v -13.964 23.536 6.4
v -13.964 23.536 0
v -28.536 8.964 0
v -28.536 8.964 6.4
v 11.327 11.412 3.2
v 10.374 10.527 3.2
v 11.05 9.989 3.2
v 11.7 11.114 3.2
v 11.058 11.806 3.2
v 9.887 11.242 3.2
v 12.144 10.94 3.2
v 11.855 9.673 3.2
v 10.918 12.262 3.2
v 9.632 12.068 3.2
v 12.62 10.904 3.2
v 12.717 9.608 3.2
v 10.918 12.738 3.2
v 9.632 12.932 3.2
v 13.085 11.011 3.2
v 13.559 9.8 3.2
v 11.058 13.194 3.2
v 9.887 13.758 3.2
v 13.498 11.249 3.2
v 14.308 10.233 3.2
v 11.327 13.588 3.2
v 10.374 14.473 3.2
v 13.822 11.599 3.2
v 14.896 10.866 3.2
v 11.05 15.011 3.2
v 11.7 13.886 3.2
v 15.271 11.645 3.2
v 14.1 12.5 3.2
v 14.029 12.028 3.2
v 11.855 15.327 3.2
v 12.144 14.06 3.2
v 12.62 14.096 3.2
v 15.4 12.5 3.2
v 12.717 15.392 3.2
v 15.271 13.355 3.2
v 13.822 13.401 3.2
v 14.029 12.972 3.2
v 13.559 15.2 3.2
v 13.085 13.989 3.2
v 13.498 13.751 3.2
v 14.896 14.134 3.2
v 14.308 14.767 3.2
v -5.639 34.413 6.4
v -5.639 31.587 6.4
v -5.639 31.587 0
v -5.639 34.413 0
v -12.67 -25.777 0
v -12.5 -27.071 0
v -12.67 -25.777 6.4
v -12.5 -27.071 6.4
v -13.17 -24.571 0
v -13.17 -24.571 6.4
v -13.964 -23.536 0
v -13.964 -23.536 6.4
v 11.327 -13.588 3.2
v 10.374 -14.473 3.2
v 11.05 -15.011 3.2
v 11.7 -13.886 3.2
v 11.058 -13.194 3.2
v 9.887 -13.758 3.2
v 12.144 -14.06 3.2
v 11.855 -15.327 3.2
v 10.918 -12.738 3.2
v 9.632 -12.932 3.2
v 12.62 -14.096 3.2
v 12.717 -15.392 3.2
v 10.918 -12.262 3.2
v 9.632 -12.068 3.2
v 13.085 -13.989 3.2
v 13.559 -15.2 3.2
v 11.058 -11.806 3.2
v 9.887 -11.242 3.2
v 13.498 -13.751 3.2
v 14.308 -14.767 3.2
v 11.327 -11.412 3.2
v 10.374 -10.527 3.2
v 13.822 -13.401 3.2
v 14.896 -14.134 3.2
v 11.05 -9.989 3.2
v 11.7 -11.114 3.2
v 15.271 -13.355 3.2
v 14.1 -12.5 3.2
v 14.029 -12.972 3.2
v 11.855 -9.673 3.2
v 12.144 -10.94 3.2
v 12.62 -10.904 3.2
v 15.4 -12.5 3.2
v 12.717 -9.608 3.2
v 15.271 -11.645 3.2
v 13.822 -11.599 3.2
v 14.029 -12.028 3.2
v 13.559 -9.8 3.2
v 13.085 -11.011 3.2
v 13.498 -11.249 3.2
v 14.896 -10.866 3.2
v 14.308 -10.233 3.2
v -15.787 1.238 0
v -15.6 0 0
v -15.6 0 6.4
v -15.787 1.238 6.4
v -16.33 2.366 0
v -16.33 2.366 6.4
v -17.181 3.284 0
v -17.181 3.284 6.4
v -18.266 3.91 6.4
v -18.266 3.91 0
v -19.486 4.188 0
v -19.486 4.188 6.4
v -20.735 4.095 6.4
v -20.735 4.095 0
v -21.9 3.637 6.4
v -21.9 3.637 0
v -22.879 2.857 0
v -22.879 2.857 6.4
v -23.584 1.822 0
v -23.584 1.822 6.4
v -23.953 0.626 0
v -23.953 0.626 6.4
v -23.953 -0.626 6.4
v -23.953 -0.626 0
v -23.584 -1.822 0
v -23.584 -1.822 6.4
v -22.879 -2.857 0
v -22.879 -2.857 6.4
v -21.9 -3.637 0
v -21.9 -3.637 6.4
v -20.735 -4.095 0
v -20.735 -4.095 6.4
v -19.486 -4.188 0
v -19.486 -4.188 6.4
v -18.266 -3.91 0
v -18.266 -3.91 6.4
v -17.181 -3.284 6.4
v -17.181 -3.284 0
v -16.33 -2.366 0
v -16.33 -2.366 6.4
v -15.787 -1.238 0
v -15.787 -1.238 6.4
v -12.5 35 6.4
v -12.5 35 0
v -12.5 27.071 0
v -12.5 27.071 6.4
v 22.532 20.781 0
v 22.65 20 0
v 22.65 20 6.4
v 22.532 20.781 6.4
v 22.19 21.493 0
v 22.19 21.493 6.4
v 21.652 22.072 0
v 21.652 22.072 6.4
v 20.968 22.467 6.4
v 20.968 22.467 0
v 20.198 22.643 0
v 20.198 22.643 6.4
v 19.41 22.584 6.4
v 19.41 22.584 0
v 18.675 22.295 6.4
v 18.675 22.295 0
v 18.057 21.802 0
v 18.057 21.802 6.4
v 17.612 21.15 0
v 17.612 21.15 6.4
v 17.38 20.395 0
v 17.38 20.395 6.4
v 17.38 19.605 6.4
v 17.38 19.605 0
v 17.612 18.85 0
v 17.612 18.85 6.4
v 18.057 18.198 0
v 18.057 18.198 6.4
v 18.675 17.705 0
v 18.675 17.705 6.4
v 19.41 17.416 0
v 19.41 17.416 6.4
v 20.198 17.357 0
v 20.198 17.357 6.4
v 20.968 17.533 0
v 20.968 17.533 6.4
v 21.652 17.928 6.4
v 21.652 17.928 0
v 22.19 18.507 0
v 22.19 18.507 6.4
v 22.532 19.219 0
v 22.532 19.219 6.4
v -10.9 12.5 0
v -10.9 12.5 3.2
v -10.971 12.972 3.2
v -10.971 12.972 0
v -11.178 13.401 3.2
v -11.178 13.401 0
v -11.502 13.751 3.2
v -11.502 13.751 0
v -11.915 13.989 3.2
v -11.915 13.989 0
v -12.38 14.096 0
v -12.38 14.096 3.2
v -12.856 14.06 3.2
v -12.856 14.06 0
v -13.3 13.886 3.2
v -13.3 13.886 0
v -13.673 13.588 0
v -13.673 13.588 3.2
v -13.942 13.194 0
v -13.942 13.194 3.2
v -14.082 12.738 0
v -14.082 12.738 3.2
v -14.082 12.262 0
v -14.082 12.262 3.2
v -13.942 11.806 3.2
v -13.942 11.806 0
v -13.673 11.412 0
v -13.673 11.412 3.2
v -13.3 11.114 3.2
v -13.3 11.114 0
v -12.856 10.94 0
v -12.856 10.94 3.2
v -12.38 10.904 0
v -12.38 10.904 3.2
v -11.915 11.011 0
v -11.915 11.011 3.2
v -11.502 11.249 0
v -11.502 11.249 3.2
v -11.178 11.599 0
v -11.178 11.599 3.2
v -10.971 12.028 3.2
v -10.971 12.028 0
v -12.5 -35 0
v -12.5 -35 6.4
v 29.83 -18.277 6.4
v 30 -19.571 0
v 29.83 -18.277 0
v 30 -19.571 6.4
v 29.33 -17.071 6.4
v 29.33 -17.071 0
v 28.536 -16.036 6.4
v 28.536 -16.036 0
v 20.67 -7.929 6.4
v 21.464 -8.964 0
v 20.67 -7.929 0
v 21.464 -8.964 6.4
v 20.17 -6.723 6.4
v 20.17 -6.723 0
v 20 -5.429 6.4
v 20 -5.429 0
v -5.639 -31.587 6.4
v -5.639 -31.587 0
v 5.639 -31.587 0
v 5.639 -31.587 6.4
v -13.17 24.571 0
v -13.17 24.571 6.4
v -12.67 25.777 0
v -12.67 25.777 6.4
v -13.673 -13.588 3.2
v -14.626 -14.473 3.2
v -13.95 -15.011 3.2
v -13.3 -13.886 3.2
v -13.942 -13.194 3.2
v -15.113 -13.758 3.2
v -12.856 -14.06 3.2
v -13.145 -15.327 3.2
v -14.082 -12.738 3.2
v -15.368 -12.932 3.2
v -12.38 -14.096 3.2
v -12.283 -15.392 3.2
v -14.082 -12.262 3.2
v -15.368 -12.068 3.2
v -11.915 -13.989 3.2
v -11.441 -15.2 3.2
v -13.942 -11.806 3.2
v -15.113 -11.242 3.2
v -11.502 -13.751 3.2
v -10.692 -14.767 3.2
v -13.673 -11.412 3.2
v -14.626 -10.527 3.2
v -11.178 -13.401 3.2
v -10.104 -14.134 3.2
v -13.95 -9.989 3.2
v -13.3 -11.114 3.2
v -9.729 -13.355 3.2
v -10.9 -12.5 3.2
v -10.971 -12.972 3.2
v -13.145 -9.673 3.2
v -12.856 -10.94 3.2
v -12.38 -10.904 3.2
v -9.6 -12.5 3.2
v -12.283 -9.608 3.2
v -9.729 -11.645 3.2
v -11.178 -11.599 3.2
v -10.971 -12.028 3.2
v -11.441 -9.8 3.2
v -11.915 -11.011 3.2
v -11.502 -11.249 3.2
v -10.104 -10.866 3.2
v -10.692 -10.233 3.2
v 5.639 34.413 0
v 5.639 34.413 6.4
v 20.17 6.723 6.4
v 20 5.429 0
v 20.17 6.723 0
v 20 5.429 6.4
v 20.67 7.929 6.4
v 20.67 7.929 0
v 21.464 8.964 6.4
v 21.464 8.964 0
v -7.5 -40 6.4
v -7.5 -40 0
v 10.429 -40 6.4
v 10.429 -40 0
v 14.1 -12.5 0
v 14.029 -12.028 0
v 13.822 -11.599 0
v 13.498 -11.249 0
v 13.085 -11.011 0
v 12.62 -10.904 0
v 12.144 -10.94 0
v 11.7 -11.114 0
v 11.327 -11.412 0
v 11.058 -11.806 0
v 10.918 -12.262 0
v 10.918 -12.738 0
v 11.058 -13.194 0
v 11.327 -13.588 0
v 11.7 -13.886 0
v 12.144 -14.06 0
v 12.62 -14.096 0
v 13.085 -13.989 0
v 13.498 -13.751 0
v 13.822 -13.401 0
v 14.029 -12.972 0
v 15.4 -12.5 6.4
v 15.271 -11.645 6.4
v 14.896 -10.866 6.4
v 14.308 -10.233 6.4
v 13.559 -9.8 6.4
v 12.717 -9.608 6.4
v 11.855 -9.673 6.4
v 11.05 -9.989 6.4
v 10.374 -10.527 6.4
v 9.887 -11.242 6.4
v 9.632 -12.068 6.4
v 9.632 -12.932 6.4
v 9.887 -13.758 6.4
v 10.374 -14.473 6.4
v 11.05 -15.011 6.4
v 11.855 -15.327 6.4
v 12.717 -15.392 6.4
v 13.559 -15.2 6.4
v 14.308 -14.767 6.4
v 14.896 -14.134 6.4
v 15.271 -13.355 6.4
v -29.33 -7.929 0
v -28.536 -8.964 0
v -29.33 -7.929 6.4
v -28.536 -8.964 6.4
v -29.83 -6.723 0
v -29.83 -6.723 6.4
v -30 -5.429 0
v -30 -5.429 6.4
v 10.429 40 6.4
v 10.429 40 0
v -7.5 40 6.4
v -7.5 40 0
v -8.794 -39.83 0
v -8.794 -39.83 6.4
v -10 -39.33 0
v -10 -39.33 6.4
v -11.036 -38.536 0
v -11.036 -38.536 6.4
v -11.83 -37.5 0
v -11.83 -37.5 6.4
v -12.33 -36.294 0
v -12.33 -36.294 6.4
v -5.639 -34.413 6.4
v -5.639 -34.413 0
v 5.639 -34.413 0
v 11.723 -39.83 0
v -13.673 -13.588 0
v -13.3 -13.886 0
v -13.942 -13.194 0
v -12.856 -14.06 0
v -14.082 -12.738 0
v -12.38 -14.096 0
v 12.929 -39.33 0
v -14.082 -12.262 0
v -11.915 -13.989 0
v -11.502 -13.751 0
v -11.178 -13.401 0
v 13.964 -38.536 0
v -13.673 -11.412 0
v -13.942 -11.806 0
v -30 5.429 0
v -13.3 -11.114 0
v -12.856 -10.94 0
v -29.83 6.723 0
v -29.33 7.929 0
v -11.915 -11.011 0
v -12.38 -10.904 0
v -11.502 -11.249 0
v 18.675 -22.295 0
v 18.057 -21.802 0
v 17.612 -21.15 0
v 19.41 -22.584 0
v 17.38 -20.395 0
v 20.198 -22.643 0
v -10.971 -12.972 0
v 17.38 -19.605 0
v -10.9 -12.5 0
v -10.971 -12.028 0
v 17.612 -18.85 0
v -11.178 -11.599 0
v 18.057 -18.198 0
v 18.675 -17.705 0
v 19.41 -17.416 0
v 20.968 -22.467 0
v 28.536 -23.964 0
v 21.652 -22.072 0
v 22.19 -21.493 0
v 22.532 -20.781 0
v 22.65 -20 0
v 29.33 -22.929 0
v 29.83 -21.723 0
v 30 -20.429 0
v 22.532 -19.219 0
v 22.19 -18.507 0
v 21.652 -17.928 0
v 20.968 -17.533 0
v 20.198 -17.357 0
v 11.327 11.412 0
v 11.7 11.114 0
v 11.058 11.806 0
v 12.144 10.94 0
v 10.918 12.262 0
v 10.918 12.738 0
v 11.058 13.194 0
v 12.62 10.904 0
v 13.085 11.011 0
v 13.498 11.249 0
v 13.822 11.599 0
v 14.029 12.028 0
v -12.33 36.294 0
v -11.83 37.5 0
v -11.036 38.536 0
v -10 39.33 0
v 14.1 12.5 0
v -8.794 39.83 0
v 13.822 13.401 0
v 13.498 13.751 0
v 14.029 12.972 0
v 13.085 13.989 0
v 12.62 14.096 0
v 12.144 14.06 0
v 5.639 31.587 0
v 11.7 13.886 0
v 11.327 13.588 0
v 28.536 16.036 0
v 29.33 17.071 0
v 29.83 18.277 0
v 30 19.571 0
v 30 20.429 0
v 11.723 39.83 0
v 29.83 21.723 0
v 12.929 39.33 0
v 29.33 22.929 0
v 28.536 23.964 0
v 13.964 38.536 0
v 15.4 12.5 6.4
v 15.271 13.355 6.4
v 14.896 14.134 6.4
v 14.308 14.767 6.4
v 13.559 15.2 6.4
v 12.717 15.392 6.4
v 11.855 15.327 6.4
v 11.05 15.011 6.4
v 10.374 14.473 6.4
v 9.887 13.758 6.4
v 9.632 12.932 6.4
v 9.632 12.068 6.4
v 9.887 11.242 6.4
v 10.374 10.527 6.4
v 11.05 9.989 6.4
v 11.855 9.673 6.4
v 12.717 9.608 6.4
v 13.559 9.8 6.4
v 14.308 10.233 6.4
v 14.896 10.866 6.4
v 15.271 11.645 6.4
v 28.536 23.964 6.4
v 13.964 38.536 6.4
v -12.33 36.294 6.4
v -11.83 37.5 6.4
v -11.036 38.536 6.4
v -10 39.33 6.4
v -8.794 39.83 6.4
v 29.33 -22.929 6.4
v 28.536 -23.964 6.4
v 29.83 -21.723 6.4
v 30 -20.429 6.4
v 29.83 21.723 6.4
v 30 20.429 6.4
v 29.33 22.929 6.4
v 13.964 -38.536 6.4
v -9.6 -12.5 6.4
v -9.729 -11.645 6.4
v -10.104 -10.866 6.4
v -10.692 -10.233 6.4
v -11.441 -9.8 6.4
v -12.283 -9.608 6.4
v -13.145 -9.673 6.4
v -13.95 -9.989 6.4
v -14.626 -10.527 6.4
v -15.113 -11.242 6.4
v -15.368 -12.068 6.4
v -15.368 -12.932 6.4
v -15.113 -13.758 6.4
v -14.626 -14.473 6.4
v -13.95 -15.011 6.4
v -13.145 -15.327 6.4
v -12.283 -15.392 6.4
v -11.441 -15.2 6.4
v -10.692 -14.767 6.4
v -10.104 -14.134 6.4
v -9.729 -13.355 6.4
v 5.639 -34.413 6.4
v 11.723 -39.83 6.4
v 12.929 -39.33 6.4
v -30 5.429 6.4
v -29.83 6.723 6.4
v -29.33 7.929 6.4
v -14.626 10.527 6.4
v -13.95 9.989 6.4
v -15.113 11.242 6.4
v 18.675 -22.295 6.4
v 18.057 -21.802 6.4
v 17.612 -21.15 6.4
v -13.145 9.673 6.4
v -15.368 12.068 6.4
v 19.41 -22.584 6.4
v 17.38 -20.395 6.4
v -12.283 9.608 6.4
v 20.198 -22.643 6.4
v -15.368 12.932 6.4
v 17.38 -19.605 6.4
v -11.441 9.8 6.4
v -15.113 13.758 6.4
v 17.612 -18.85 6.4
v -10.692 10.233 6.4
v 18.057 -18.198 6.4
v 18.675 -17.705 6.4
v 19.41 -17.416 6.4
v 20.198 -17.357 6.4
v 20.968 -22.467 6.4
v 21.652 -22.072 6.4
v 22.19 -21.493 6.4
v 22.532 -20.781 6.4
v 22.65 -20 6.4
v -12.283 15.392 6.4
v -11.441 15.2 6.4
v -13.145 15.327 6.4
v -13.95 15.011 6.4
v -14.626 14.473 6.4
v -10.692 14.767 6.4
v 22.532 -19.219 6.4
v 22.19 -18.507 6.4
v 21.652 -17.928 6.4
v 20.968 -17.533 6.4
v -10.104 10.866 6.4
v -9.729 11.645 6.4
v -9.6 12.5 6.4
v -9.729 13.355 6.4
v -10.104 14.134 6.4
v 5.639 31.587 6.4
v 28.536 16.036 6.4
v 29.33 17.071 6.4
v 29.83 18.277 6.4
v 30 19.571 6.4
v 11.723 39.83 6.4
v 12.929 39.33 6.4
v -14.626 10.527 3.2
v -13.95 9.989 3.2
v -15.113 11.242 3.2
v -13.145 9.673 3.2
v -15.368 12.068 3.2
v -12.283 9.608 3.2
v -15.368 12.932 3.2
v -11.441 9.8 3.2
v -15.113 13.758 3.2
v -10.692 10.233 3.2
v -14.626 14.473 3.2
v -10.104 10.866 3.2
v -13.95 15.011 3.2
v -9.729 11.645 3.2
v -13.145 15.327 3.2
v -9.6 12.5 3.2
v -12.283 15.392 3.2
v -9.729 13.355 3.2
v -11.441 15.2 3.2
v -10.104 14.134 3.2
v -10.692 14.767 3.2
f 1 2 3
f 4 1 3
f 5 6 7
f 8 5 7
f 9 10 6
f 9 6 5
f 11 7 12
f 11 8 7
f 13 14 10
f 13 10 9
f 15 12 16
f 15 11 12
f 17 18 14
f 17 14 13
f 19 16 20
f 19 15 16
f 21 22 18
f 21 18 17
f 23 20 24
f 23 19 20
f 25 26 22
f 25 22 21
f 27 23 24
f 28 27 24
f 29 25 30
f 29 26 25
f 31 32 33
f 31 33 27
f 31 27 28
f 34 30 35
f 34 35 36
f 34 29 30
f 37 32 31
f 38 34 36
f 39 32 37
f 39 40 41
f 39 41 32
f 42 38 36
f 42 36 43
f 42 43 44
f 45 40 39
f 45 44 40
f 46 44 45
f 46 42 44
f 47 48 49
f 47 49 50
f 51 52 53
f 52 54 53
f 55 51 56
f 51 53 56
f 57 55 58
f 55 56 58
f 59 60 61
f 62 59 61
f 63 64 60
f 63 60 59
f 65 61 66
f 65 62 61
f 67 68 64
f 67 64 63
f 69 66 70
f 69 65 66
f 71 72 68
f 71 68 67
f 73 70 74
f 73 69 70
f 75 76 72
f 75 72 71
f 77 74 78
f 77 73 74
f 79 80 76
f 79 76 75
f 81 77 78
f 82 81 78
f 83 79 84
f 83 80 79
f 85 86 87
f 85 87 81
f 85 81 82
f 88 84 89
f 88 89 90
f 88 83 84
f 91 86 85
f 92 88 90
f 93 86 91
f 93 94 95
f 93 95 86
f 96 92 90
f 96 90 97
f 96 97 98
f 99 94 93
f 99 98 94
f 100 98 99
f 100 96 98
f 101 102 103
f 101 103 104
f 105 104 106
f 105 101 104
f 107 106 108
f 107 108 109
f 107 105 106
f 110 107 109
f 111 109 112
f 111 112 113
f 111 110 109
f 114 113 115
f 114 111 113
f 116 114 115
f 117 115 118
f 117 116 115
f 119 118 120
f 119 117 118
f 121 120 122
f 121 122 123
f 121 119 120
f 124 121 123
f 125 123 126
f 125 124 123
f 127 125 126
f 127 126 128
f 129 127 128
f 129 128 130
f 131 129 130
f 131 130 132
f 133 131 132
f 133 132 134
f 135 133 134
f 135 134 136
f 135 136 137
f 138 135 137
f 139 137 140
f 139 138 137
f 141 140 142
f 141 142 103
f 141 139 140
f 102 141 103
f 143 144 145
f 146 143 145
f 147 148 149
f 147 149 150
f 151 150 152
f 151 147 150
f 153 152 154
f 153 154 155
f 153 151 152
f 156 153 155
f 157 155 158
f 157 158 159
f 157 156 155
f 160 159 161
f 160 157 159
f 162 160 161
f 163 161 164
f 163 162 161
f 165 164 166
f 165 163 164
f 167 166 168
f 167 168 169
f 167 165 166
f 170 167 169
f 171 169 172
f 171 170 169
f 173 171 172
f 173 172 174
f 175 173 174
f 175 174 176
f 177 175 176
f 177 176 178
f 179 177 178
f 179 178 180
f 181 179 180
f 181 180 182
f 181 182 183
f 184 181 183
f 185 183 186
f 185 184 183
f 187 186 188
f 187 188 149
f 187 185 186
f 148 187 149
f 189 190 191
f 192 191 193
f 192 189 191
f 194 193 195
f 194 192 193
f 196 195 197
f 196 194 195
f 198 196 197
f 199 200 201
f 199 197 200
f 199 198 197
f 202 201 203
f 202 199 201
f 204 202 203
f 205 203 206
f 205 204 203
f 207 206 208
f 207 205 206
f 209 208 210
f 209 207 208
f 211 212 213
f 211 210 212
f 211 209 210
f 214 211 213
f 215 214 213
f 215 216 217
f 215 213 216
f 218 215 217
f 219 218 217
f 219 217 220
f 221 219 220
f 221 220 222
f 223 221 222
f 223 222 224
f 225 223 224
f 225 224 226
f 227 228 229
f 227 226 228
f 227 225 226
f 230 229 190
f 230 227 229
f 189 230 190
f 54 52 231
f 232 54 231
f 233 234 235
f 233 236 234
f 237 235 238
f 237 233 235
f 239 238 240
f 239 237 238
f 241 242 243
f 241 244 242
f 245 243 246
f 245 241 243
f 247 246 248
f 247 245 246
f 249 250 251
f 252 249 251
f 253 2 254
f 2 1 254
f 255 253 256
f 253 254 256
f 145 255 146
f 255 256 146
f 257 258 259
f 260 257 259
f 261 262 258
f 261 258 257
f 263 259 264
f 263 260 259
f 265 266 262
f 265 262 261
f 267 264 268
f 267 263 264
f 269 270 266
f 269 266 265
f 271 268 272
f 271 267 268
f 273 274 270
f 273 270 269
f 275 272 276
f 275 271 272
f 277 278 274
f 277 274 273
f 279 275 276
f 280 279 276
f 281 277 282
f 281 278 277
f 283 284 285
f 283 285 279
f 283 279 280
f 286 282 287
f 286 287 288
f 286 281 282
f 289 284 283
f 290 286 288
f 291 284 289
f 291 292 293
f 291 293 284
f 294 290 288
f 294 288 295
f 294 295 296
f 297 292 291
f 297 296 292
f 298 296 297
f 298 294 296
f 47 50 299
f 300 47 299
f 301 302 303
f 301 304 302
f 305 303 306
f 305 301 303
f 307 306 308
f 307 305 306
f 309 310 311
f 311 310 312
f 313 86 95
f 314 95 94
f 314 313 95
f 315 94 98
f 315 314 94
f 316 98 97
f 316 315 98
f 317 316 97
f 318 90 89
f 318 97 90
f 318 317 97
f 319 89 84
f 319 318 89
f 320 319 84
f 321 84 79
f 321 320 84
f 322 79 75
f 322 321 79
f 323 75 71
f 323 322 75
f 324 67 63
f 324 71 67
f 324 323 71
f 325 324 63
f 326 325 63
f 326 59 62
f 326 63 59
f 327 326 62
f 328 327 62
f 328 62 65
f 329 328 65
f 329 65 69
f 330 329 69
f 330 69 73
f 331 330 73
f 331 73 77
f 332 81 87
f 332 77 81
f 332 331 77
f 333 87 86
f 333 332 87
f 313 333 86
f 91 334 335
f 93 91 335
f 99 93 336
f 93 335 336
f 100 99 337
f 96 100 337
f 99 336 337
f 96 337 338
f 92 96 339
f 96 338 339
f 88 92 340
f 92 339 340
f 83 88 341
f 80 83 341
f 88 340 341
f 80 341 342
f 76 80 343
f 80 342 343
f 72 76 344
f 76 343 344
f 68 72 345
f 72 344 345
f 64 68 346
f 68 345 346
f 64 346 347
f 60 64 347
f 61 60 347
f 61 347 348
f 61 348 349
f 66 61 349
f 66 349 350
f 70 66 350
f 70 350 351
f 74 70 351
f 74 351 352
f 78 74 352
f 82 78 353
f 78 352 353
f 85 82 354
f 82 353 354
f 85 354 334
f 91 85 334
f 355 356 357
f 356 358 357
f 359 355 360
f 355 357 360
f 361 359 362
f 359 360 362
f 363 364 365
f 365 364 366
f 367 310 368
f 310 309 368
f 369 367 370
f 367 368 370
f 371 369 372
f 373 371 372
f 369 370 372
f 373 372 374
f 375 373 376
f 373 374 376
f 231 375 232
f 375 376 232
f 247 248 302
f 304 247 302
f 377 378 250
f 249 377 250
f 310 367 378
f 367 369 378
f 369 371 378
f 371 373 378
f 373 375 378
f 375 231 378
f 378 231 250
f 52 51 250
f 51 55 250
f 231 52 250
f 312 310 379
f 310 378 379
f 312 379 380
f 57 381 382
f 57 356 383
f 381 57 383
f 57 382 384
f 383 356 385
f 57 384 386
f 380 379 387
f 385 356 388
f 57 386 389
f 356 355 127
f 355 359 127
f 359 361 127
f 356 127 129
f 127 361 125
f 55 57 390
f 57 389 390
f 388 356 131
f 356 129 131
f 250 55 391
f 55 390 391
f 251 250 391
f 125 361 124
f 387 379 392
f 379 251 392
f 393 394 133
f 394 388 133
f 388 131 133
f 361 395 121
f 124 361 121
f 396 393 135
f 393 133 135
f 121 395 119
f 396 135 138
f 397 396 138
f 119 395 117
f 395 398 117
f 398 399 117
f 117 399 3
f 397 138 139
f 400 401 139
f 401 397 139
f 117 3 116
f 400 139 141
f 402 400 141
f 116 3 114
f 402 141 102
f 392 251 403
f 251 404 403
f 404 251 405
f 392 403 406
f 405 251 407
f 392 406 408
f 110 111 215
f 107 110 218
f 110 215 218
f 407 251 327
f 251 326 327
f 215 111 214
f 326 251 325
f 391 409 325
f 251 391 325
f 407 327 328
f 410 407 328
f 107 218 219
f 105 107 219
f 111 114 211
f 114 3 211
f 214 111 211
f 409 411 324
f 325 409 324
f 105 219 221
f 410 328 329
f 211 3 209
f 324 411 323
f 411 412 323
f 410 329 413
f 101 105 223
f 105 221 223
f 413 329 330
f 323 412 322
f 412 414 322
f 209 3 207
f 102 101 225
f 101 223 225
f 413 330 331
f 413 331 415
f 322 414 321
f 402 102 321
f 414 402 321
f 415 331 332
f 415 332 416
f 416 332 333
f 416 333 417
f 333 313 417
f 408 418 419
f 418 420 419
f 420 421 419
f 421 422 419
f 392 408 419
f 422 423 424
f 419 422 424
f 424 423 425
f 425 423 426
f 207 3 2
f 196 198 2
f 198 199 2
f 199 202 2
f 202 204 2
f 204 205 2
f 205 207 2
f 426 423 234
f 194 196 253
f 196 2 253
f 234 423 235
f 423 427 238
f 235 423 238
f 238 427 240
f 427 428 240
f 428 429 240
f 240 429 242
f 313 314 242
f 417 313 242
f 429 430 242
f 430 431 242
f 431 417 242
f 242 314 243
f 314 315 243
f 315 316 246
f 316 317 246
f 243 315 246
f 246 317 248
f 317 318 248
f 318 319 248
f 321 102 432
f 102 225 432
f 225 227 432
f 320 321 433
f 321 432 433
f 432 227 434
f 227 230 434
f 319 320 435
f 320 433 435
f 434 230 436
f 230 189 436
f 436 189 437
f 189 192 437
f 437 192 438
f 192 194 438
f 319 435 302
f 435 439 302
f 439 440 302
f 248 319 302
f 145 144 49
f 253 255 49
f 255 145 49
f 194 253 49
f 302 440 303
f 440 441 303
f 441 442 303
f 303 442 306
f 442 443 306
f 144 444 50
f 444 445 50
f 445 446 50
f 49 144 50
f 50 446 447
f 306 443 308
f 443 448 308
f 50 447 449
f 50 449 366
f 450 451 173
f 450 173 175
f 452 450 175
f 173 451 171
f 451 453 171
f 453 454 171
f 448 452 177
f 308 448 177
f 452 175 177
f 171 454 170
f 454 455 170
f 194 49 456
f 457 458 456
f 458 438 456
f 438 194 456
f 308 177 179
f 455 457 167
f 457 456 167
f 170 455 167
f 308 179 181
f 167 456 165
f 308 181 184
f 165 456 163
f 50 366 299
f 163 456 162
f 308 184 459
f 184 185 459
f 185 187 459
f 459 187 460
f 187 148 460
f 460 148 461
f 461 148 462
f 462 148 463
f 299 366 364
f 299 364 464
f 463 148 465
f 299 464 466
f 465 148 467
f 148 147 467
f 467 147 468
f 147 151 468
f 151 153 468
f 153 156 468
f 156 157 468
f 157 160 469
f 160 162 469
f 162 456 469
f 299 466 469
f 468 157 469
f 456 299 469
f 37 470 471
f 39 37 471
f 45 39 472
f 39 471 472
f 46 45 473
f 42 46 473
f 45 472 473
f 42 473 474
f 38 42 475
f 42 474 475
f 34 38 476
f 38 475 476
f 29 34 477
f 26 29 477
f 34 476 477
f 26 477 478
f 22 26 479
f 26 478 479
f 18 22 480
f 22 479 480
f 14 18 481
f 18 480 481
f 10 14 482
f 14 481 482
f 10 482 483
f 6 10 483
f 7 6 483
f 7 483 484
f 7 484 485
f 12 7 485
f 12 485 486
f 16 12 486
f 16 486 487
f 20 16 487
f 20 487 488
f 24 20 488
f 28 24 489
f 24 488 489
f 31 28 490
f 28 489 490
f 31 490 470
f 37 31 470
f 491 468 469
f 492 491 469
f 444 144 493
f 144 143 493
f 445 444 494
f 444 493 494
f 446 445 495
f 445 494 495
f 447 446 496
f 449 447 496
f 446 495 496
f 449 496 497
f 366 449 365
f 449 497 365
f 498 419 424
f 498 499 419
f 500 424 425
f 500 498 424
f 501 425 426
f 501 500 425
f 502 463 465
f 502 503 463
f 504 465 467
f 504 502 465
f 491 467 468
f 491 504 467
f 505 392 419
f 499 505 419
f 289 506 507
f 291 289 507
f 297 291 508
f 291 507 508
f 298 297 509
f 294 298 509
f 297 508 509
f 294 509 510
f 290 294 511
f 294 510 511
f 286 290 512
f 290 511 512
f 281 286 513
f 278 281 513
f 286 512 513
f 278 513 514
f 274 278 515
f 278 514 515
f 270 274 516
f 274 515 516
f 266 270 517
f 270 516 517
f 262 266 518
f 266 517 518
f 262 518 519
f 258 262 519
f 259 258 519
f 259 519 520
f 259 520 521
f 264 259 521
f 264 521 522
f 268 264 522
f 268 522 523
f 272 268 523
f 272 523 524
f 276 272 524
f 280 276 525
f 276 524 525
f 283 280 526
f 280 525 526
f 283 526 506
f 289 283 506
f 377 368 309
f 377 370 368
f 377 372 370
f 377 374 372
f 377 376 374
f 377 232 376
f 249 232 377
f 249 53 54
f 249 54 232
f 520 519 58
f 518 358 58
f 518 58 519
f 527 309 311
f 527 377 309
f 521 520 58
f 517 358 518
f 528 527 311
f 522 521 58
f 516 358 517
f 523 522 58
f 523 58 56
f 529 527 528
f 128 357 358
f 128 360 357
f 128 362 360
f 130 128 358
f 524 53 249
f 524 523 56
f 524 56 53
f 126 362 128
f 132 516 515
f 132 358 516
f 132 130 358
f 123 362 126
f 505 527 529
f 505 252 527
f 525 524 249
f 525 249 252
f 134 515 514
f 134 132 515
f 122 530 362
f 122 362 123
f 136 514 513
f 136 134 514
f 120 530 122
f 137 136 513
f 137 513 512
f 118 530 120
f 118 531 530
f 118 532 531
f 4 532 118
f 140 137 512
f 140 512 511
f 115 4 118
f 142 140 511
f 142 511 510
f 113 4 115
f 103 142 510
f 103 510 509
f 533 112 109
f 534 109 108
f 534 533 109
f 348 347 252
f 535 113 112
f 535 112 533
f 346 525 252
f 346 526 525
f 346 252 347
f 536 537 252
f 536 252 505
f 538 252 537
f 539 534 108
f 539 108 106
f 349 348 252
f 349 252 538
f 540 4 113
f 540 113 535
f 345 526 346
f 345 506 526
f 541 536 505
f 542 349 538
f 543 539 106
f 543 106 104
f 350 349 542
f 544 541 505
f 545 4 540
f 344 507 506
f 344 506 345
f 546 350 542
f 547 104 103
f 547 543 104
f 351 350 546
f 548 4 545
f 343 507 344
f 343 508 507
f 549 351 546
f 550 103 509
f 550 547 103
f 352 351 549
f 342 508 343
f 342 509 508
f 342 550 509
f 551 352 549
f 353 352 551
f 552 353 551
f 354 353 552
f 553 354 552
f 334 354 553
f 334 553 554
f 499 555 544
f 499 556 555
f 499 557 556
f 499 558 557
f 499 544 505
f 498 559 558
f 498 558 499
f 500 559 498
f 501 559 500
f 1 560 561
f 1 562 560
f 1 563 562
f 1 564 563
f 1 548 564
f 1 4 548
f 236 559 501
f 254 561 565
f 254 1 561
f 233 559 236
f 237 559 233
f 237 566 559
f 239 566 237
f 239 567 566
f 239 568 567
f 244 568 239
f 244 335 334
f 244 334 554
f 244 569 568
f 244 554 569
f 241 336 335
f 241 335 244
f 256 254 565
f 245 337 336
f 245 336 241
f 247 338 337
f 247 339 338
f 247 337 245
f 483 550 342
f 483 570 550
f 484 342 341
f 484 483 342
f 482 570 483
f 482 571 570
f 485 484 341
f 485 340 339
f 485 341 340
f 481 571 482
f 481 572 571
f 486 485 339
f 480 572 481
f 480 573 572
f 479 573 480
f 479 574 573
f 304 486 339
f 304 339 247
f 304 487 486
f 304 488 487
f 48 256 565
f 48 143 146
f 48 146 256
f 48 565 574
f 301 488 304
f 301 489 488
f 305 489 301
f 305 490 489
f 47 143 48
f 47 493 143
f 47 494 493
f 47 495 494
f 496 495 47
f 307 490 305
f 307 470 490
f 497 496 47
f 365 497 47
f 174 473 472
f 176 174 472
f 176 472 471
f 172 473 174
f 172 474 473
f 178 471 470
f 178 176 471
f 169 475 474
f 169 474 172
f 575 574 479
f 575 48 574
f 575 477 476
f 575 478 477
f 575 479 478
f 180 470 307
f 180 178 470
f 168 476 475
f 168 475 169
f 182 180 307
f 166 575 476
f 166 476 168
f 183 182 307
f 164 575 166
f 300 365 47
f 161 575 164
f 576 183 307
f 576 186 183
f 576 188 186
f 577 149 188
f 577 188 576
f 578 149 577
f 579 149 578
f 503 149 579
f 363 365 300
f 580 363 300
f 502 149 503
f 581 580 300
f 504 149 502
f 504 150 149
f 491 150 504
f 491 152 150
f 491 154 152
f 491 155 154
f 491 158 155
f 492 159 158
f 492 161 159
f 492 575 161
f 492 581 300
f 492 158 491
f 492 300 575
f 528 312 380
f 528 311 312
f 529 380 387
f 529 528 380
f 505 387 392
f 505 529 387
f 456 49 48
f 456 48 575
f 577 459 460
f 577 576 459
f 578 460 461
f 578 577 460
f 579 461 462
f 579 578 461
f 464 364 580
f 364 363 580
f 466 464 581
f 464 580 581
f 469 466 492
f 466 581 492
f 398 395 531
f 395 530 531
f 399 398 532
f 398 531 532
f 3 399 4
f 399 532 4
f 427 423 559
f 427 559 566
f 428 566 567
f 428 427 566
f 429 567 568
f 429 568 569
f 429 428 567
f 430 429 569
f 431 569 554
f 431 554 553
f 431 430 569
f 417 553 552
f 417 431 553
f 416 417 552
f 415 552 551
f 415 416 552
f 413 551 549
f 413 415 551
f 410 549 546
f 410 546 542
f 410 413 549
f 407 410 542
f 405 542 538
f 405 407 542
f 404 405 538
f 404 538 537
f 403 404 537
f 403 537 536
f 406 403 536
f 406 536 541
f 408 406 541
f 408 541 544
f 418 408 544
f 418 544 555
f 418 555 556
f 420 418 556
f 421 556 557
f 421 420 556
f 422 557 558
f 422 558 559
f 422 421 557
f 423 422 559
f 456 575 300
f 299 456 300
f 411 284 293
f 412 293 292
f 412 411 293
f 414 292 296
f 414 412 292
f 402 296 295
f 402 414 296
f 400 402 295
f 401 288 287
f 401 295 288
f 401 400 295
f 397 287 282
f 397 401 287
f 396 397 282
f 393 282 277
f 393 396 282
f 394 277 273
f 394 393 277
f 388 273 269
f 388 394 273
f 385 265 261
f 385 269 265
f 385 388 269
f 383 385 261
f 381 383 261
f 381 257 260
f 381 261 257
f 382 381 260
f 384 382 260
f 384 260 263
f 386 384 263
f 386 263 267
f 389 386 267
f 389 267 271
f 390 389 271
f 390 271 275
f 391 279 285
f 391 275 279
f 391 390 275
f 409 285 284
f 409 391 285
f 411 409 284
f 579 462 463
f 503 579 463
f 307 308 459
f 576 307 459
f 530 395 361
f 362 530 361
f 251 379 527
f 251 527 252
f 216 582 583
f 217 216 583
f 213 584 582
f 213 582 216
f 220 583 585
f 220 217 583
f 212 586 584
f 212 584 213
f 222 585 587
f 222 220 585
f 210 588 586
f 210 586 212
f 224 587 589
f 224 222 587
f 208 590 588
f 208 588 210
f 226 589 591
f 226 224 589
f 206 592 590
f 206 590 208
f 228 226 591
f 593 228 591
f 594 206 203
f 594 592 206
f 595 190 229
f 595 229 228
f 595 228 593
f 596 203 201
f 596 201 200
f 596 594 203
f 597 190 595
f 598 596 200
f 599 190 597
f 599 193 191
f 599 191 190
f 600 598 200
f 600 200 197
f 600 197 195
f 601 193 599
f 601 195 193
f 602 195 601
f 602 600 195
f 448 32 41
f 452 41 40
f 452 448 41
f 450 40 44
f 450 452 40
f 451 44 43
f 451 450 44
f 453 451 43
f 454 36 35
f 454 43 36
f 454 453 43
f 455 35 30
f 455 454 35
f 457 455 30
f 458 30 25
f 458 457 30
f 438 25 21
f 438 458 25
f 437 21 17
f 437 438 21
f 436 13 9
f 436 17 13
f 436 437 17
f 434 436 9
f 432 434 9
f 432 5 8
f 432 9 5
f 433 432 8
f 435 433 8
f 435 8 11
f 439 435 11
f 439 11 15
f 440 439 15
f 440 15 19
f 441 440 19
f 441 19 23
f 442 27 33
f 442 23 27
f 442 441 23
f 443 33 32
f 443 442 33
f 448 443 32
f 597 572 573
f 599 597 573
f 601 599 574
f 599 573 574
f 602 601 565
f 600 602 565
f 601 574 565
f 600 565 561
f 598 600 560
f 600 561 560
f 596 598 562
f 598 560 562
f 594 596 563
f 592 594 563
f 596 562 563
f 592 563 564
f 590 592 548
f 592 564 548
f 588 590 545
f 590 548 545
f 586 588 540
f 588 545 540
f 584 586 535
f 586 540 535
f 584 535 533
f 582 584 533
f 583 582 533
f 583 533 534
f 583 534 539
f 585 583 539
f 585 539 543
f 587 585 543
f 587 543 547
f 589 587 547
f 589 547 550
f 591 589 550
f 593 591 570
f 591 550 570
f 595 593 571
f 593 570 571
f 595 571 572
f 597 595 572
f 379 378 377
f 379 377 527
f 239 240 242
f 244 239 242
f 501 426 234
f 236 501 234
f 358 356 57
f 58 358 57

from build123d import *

# Parameters (mm, degrees)
F0_R     = 1.6
F0_W     = 11.2785340156
F0_H     = 2.8266120087
F0_R_2   = 2.65
F0_R_3   = 4.2
F1_DEPTH = 6.4
F2_R     = 5
F3_R     = 2.9
F4_DEPTH = 3.2


# Not quite as in the source:
# - a feature names something its author has since deleted; it is built from what else it names


with BuildPart() as f1:
    # F0 (on Top) → F1 (new body)
    with BuildSketch(Plane.XY):
        Polygon((-12.5, -40), (12.5, -40), (30, -22.5), (30, -17.5), (20, -7.5), (20, 7.5), (30, 17.5), (30, 22.5), (12.5, 40), (-12.5, 40), (-12.5, 25), (-30, 7.5), (-30, -7.5), (-12.5, -25), align=None)
        with Locations((-12.5, -12.5)):
            Circle(F0_R, mode=Mode.SUBTRACT)
        with Locations((0, -33)):
            Rectangle(F0_W, F0_H, mode=Mode.SUBTRACT)
        with Locations((12.5, -12.5)):
            Circle(F0_R, mode=Mode.SUBTRACT)
        with Locations((20, -20)):
            Circle(F0_R_2, mode=Mode.SUBTRACT)
        with Locations((-19.8, 0)):
            Circle(F0_R_3, mode=Mode.SUBTRACT)
        with Locations((-12.5, 12.5)):
            Circle(F0_R, mode=Mode.SUBTRACT)
        with Locations((12.5, 12.5)):
            Circle(F0_R, mode=Mode.SUBTRACT)
        with Locations((0, 33)):
            Rectangle(F0_W, F0_H, mode=Mode.SUBTRACT)
        with Locations((20, 20)):
            Circle(F0_R_2, mode=Mode.SUBTRACT)
    extrude(amount=F1_DEPTH)

    # F2
    f2_edges = [f1.edges().sort_by_distance(p)[0] for p in [
        (30, 17.5, 3.2),
        (30, 22.5, 3.2),
        (-12.5, -25, 3.2),
        (-12.5, 25, 3.2),
        (-12.5, -40, 3.2),
        (12.5, -40, 3.2),
        (30, -22.5, 3.2),
        (30, -17.5, 3.2),
        (20, -7.5, 3.2),
        (20, 7.5, 3.2),
        (12.5, 40, 3.2),
        (-12.5, 40, 3.2),
        (-30, 7.5, 3.2),
        (-30, -7.5, 3.2),
    ]]
    fillet(f2_edges, radius=F2_R)

    # F3 (on face) → F4 (cut)
    with BuildSketch(Plane.XY.offset(6.4)):
        with Locations((-12.5, 12.5)):
            Circle(F3_R)
        with Locations((12.5, 12.5)):
            Circle(F3_R)
        with Locations((12.5, -12.5)):
            Circle(F3_R)
        with Locations((-12.5, -12.5)):
            Circle(F3_R)
    extrude(amount=-F4_DEPTH, mode=Mode.SUBTRACT)


solid = f1.part
